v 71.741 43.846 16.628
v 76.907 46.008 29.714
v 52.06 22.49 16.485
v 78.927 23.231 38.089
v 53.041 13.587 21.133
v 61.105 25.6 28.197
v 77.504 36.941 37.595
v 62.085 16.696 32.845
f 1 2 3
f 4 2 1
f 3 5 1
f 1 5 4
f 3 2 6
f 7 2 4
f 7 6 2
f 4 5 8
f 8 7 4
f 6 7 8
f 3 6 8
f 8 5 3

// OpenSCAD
// Auto-generated auxetic polyhedron
points = [
    [52.059952, 22.490314, 16.484935],
    [76.906811, 46.008003, 29.714391],
    [71.740579, 43.845858, 16.628267],
    [78.926901, 23.231462, 38.089205],
    [53.040690, 13.586930, 21.133137],
    [61.104578, 25.599755, 28.196948],
    [77.503985, 36.941489, 37.594650],
    [62.085316, 16.696370, 32.845149],
];

faces = [
    [0, 1, 2],
    [2, 1, 3],
    [2, 4, 0],
    [3, 4, 2],
    [5, 1, 0],
    [3, 1, 6],
    [1, 5, 6],
    [7, 4, 3],
    [3, 6, 7],
    [7, 6, 5],
    [7, 5, 0],
    [0, 4, 7],
];

polyhedron(points = points, faces = faces);
